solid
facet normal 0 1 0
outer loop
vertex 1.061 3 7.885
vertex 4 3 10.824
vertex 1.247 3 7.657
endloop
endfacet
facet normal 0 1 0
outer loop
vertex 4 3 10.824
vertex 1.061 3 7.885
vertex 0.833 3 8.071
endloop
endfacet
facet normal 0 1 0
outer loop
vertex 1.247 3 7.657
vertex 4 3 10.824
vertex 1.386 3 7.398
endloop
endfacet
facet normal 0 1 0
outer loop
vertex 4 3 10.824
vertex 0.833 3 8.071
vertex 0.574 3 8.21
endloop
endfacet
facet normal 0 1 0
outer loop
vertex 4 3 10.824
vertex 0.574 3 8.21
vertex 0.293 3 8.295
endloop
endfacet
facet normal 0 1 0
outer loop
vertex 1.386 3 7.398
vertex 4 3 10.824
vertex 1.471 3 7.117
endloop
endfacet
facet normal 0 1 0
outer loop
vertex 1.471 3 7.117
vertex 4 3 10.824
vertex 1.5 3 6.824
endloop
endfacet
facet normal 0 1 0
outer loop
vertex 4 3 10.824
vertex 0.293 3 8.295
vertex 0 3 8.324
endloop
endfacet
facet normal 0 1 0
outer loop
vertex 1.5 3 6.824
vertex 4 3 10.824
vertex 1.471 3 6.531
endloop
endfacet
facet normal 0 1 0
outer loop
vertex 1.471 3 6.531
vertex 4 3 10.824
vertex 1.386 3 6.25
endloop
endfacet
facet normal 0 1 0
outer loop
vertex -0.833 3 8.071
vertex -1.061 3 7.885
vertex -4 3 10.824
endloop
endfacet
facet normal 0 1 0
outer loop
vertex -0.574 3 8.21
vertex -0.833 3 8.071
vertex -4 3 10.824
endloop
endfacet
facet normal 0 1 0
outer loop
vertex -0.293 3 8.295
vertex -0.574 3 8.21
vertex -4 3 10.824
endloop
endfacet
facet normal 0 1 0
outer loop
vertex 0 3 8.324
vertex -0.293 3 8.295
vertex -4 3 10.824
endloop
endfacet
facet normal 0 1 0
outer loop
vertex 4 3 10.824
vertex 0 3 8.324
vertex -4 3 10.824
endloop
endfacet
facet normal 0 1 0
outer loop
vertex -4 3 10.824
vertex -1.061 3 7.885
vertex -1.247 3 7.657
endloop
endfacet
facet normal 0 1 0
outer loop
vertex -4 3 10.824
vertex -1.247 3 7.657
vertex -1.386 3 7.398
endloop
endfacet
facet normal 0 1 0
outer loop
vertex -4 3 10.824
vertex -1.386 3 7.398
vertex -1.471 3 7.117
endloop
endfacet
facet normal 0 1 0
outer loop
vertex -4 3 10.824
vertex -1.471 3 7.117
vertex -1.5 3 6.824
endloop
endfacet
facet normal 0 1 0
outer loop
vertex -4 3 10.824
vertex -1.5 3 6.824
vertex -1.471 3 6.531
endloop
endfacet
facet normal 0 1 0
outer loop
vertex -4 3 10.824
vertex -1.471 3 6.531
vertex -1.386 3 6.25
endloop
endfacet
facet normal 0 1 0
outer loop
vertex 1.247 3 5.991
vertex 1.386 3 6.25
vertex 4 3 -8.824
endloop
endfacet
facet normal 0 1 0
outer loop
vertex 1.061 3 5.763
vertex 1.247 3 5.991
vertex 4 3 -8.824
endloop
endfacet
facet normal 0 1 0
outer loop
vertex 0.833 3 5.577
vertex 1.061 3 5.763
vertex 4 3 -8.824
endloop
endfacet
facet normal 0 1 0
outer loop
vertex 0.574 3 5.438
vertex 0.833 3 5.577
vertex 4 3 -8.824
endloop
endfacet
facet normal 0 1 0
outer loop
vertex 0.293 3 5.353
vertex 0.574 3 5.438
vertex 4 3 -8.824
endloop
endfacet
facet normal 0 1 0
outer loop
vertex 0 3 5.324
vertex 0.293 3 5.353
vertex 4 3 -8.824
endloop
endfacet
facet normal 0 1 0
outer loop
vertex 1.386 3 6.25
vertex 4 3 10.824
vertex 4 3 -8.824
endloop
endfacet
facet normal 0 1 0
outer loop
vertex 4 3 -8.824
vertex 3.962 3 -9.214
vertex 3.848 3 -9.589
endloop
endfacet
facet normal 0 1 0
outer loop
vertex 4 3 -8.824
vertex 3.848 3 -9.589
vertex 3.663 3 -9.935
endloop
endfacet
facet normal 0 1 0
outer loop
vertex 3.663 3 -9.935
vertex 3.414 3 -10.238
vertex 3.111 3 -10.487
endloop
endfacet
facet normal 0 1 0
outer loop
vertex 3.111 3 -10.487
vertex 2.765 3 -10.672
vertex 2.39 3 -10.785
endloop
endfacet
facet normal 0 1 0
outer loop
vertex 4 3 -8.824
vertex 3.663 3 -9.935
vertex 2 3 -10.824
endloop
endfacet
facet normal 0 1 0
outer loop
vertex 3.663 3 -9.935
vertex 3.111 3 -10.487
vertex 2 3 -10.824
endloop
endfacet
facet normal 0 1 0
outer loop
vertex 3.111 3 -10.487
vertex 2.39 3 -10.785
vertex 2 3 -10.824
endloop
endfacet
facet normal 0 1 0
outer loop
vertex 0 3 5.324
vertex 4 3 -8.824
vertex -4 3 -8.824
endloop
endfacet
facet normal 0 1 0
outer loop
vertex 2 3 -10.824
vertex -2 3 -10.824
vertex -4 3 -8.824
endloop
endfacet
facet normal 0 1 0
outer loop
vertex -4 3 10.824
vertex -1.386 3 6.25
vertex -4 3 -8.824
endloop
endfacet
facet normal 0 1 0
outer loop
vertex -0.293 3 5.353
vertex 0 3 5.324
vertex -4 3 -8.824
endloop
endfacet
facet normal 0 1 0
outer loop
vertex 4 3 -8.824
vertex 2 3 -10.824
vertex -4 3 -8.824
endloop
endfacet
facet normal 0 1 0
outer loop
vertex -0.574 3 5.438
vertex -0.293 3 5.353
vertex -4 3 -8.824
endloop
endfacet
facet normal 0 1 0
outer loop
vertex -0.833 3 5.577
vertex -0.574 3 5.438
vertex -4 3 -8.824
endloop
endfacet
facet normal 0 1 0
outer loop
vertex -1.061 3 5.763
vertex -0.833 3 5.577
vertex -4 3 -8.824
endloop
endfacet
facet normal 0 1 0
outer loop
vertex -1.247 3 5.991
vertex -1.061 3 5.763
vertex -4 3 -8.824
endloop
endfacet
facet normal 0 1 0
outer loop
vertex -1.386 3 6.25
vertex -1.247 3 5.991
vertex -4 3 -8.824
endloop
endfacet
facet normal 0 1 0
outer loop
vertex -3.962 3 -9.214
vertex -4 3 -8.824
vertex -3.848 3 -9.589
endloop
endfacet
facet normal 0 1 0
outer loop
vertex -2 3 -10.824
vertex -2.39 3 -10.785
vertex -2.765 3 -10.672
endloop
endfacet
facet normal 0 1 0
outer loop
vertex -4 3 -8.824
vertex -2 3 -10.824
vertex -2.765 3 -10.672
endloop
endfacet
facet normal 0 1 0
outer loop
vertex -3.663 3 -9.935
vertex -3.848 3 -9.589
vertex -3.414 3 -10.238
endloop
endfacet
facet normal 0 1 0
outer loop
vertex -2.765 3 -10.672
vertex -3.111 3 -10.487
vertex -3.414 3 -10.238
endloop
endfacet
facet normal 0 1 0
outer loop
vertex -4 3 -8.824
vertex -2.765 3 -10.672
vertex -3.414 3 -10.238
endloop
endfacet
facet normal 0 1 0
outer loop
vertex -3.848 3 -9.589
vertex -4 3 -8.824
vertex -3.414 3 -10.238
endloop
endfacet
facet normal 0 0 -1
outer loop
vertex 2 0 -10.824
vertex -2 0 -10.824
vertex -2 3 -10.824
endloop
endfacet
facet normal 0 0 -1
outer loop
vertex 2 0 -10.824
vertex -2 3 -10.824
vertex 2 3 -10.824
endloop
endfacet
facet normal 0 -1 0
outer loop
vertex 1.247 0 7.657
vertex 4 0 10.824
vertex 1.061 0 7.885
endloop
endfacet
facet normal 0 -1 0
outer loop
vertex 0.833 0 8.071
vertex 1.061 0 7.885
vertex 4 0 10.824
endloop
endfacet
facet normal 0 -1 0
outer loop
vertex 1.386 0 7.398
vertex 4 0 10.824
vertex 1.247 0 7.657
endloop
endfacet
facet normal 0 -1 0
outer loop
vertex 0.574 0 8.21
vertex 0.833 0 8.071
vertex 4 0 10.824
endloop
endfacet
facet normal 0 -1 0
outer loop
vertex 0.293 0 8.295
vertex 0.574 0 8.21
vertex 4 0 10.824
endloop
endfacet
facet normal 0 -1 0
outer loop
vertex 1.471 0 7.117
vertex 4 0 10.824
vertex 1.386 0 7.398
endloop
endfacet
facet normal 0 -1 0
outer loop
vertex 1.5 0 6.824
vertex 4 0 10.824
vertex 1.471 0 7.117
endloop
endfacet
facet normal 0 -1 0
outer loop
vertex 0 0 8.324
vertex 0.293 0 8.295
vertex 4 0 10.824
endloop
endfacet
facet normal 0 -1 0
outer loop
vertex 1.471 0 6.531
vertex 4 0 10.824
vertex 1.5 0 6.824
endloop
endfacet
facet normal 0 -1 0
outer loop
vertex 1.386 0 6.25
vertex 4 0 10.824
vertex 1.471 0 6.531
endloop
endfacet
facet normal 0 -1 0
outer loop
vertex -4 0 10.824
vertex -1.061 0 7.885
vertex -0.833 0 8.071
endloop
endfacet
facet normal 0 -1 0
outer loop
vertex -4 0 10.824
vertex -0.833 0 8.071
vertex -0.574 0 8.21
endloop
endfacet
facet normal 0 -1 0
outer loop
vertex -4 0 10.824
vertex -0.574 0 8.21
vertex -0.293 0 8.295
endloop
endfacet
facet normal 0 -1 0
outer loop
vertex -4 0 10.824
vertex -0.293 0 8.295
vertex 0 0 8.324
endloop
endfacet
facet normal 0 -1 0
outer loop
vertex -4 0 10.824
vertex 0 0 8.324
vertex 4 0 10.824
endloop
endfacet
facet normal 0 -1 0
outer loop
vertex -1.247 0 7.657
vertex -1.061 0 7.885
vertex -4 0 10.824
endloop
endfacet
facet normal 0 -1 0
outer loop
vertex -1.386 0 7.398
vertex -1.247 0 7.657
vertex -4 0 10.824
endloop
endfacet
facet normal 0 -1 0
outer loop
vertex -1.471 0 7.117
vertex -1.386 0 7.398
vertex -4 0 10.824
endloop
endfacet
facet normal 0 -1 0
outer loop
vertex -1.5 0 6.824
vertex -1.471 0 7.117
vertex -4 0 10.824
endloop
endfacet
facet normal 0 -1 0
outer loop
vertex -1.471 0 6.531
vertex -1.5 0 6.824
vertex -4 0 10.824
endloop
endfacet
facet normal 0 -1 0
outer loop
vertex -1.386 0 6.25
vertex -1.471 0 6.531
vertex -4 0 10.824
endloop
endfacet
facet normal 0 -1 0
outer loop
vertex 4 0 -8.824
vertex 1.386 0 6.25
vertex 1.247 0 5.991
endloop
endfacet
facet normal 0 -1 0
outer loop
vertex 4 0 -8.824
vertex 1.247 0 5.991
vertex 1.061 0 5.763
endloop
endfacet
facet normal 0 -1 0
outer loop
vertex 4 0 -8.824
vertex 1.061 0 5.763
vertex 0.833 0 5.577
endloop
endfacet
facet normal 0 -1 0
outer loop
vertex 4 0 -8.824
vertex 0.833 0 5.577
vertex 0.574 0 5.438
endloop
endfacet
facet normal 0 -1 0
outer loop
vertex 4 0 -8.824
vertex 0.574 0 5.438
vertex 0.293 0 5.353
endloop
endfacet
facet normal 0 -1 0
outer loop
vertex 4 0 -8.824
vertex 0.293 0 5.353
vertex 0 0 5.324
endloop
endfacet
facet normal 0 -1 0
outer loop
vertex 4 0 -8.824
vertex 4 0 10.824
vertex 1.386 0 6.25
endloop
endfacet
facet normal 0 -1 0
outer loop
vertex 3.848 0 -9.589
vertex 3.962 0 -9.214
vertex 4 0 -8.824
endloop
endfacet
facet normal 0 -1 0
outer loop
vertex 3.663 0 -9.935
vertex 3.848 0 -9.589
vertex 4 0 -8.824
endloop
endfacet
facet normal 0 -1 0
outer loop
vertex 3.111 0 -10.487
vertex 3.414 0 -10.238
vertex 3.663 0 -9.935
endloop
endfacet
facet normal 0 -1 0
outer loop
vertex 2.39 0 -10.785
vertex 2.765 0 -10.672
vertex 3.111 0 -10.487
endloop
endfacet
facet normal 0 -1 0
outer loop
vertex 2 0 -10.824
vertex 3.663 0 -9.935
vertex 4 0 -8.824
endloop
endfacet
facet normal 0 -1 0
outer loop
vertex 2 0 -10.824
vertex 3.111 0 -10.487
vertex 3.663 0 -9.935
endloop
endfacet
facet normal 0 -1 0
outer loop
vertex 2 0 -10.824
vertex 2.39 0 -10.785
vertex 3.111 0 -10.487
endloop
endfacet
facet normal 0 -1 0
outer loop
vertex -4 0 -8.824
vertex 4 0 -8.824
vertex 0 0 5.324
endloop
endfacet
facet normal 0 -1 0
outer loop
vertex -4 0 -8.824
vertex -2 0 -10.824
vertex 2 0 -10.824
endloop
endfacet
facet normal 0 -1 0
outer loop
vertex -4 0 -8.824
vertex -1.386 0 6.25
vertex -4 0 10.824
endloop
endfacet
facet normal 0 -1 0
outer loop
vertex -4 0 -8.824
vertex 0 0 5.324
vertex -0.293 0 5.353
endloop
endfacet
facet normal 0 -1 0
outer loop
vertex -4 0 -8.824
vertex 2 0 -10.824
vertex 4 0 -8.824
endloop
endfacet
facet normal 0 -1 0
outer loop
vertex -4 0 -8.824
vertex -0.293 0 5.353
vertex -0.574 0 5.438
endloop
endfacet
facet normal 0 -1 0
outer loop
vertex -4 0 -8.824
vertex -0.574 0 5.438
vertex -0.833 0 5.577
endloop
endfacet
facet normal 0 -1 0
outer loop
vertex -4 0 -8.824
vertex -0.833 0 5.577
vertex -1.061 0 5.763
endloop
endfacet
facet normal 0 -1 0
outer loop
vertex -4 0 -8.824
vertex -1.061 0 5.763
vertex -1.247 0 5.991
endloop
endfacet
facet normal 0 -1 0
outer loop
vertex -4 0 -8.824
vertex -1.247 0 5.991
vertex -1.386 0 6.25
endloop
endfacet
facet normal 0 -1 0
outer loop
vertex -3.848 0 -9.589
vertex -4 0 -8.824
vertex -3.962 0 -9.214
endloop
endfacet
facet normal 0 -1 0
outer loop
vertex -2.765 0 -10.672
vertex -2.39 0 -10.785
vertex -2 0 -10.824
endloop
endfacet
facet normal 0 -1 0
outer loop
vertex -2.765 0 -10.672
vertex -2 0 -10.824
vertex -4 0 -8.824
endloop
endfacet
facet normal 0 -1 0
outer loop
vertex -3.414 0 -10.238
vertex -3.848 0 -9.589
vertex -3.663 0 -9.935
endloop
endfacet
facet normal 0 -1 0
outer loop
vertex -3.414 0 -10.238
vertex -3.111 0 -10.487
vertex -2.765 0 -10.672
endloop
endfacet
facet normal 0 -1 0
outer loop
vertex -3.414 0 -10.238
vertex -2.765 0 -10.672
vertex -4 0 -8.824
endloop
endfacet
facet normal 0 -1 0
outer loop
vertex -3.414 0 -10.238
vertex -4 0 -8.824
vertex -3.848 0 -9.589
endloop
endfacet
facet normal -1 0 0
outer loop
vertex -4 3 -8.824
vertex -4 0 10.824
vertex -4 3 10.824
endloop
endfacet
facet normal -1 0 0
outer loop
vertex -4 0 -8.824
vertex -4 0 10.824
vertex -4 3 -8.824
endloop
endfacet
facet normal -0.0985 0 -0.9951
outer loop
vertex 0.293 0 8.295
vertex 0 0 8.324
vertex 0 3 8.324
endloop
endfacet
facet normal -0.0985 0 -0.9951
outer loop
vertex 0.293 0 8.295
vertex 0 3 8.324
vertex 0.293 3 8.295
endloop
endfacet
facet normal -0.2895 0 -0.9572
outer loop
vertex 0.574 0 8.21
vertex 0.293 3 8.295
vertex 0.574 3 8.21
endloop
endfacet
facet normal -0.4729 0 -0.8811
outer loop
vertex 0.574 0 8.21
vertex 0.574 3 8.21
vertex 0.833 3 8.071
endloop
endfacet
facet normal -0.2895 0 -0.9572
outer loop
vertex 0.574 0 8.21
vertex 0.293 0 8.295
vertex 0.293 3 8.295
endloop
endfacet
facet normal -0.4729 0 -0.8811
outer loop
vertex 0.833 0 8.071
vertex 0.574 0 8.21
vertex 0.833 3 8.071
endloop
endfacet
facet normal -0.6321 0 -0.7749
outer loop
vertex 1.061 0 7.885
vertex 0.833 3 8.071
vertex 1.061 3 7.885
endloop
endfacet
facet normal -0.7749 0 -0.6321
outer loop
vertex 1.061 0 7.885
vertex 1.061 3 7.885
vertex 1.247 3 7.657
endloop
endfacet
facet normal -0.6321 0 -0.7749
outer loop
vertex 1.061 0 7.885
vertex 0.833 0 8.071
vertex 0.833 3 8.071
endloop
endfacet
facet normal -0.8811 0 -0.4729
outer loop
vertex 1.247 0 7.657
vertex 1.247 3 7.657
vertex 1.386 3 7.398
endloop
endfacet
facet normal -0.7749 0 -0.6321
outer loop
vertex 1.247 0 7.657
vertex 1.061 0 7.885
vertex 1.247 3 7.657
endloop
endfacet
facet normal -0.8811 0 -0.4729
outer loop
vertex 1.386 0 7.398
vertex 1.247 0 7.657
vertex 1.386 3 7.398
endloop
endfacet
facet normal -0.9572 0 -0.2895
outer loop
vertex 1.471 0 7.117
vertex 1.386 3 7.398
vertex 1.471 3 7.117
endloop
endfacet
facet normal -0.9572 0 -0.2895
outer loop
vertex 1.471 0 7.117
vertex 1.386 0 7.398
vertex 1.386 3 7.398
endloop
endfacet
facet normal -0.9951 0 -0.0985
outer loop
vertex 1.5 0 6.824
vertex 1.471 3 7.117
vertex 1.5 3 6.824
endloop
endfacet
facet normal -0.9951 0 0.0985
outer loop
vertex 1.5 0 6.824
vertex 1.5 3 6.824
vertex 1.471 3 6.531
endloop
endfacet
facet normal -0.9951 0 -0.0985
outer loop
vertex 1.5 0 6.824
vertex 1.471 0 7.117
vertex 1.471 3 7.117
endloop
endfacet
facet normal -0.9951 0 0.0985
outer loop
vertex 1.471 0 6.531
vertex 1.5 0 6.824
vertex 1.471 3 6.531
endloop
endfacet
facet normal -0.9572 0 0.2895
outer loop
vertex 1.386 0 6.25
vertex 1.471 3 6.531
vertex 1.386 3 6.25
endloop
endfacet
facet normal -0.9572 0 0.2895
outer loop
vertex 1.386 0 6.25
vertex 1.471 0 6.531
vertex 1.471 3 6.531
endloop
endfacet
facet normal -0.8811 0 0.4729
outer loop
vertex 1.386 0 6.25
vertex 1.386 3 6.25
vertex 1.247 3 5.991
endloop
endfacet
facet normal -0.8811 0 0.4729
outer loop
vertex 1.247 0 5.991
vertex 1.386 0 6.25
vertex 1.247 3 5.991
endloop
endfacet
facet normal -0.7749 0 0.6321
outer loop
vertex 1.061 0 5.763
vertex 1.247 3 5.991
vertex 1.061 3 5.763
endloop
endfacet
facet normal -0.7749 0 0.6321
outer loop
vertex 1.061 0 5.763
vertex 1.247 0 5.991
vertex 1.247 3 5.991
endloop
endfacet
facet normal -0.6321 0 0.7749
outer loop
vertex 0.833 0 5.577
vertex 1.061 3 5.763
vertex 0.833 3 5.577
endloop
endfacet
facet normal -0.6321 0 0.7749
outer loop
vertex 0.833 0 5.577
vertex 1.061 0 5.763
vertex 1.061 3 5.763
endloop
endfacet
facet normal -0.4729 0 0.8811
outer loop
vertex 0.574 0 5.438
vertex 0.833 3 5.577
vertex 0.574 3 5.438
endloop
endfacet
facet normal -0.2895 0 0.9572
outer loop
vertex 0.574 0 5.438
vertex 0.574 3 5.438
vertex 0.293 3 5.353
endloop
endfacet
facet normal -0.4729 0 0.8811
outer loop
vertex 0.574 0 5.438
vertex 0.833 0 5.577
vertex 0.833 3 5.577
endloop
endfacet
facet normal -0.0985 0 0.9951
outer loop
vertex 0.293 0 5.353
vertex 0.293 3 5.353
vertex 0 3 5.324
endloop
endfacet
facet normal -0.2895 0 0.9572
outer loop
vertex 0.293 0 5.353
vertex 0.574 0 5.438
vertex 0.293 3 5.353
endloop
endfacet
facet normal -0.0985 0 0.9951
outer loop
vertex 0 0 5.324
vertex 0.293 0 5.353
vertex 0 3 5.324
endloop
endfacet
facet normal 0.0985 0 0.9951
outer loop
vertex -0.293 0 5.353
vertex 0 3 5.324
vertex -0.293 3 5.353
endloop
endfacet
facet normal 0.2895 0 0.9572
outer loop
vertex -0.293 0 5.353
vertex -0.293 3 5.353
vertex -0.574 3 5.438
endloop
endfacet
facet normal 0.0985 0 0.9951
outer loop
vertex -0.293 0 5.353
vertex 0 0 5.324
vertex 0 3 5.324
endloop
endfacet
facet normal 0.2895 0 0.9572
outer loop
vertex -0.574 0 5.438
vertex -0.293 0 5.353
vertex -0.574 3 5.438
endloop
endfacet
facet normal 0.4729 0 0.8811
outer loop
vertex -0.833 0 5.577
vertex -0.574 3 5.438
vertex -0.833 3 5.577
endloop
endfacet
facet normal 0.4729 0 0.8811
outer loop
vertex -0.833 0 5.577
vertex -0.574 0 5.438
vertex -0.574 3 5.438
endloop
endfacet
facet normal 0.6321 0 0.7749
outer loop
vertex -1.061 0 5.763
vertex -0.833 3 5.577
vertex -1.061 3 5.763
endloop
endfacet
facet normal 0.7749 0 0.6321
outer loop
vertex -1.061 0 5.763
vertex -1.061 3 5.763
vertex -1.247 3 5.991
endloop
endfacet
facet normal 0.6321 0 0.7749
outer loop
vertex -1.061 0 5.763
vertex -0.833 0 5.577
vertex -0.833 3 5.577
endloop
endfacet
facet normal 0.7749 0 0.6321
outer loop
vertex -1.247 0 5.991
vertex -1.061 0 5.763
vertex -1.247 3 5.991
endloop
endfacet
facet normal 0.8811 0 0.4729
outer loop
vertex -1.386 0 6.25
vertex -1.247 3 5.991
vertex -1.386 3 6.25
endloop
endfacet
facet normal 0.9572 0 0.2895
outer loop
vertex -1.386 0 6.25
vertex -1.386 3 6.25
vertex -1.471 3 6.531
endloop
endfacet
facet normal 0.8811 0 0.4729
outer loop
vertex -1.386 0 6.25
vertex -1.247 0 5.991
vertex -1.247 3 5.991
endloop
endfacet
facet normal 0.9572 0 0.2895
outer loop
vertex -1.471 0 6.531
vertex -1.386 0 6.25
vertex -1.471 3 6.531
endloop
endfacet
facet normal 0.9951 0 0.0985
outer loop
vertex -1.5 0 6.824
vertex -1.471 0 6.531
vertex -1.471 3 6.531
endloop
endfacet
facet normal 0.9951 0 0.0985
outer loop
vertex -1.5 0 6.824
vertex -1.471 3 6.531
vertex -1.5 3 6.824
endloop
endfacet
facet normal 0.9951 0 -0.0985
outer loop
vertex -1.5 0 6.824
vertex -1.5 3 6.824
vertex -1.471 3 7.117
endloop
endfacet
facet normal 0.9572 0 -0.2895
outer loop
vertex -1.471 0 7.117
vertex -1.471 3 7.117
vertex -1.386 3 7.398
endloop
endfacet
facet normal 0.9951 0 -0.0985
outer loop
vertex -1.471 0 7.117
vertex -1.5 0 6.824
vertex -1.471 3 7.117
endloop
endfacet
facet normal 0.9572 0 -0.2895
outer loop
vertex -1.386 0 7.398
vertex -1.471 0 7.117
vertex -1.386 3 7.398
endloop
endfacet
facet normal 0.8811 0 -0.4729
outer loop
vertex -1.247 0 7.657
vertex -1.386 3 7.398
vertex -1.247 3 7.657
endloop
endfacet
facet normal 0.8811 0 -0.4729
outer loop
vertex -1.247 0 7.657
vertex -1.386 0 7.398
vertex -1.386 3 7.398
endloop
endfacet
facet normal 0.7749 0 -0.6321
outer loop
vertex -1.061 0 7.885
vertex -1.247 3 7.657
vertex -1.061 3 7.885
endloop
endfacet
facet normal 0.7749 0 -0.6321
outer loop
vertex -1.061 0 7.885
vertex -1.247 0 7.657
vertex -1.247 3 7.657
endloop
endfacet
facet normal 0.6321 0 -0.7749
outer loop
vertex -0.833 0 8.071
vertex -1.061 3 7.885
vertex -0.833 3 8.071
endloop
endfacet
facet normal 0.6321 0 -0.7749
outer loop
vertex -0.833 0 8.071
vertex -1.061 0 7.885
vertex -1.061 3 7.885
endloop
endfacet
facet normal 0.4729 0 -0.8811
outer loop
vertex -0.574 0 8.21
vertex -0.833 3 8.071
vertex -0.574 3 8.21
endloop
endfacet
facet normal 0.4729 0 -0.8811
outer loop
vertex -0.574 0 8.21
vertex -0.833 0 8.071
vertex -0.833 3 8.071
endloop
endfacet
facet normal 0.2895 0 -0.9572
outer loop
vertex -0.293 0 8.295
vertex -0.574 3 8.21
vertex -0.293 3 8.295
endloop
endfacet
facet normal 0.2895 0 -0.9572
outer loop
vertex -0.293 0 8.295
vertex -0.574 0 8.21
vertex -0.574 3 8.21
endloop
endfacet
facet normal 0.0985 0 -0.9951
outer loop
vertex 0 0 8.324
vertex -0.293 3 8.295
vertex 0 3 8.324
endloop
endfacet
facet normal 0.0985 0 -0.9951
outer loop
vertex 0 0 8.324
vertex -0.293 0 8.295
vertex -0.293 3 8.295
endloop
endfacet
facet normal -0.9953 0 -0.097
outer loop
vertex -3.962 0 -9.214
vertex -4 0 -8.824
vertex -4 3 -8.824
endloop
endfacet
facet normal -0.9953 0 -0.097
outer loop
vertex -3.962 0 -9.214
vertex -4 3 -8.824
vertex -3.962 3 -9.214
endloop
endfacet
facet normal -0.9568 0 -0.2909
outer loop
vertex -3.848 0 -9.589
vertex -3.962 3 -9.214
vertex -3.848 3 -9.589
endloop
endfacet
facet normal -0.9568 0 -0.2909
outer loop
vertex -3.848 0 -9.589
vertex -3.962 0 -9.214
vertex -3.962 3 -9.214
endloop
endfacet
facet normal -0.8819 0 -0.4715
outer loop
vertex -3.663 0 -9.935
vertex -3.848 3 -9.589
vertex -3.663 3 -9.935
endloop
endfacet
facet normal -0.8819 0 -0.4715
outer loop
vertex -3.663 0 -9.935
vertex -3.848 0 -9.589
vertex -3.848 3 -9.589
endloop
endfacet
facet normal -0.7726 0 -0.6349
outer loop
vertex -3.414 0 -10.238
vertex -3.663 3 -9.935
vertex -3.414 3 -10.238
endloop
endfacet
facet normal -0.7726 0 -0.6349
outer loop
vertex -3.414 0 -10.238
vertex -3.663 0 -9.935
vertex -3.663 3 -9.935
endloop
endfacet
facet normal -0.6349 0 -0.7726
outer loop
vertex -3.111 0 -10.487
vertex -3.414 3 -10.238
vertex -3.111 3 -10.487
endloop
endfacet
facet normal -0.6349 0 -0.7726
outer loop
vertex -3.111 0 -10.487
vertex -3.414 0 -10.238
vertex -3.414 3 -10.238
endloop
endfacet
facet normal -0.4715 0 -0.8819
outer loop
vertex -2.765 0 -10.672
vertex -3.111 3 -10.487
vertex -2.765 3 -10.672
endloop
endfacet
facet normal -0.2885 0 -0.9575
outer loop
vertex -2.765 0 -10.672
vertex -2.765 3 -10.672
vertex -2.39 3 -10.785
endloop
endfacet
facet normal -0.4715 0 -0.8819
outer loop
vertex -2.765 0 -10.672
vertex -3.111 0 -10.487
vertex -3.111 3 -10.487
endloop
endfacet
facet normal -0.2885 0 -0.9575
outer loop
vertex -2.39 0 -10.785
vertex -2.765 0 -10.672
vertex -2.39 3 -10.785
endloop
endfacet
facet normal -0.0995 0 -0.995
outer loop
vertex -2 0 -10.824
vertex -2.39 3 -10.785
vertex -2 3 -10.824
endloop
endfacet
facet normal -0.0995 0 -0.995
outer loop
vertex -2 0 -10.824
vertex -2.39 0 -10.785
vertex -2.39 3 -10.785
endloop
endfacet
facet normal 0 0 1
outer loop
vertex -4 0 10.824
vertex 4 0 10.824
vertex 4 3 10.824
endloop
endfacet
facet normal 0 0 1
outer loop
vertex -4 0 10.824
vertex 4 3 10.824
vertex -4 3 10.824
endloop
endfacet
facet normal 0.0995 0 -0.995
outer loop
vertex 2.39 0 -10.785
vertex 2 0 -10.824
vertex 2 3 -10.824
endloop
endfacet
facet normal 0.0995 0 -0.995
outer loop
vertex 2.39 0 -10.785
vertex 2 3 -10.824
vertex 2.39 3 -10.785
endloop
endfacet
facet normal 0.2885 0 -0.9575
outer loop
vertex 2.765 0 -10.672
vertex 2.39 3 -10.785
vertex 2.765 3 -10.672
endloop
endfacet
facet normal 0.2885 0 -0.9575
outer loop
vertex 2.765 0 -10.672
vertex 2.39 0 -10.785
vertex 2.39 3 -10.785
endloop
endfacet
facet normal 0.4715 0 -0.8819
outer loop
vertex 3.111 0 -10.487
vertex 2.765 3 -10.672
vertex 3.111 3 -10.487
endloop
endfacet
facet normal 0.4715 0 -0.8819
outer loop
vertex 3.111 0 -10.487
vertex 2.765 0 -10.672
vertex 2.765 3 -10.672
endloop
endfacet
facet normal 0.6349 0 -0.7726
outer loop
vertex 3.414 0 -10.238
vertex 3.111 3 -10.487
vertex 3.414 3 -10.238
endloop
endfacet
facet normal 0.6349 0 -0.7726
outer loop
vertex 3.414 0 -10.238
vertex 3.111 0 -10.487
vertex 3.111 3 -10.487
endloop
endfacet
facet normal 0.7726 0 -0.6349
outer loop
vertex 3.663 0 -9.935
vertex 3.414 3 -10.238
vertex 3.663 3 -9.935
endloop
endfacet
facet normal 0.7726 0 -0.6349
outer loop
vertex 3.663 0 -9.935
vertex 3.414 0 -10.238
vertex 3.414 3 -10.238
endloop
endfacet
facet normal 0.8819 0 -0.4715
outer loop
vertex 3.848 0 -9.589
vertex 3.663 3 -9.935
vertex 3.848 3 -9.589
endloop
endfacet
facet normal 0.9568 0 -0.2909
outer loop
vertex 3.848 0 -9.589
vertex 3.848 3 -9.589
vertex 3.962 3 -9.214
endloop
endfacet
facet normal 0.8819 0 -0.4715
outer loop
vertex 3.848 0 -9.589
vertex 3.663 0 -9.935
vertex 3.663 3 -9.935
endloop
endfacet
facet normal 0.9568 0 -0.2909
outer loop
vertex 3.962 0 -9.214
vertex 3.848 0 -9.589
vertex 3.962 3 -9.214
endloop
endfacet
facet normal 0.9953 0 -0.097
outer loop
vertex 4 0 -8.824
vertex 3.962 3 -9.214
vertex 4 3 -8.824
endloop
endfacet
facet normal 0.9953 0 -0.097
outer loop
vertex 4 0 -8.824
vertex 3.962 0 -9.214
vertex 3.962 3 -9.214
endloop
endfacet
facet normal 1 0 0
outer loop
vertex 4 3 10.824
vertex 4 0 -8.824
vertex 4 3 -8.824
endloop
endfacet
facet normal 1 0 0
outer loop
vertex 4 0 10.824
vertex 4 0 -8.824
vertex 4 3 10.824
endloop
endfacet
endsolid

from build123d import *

# Parameters (mm, degrees)
SKETCH1_R           = 1.5
BOSS_EXTRUDE1_DEPTH = 3


with BuildPart() as part:
    # Sketch1 → Boss-Extrude1 (new body)
    with BuildSketch(Plane(origin=(0, 0, 0), x_dir=(1, 0, 0), z_dir=(0, 1, 0))):
        with BuildLine():
            Line((4, -10.823913854), (-4, -10.823913854))
            Line((-4, -10.823913854), (-4, 8.823913854))
            ThreePointArc((-4, 8.823913854), (-3.414213562, 10.238127416), (-2, 10.823913854))
            Line((-2, 10.823913854), (2, 10.823913854))
            ThreePointArc((2, 10.823913854), (3.414213562, 10.238127416), (4, 8.823913854))
            Line((4, 8.823913854), (4, -10.823913854))
        make_face()
        with Locations(Location((0, -6.823913854, 0), (0, 0, 270))):
            Circle(SKETCH1_R, mode=Mode.SUBTRACT)
    extrude(amount=BOSS_EXTRUDE1_DEPTH)


solid = part.part
